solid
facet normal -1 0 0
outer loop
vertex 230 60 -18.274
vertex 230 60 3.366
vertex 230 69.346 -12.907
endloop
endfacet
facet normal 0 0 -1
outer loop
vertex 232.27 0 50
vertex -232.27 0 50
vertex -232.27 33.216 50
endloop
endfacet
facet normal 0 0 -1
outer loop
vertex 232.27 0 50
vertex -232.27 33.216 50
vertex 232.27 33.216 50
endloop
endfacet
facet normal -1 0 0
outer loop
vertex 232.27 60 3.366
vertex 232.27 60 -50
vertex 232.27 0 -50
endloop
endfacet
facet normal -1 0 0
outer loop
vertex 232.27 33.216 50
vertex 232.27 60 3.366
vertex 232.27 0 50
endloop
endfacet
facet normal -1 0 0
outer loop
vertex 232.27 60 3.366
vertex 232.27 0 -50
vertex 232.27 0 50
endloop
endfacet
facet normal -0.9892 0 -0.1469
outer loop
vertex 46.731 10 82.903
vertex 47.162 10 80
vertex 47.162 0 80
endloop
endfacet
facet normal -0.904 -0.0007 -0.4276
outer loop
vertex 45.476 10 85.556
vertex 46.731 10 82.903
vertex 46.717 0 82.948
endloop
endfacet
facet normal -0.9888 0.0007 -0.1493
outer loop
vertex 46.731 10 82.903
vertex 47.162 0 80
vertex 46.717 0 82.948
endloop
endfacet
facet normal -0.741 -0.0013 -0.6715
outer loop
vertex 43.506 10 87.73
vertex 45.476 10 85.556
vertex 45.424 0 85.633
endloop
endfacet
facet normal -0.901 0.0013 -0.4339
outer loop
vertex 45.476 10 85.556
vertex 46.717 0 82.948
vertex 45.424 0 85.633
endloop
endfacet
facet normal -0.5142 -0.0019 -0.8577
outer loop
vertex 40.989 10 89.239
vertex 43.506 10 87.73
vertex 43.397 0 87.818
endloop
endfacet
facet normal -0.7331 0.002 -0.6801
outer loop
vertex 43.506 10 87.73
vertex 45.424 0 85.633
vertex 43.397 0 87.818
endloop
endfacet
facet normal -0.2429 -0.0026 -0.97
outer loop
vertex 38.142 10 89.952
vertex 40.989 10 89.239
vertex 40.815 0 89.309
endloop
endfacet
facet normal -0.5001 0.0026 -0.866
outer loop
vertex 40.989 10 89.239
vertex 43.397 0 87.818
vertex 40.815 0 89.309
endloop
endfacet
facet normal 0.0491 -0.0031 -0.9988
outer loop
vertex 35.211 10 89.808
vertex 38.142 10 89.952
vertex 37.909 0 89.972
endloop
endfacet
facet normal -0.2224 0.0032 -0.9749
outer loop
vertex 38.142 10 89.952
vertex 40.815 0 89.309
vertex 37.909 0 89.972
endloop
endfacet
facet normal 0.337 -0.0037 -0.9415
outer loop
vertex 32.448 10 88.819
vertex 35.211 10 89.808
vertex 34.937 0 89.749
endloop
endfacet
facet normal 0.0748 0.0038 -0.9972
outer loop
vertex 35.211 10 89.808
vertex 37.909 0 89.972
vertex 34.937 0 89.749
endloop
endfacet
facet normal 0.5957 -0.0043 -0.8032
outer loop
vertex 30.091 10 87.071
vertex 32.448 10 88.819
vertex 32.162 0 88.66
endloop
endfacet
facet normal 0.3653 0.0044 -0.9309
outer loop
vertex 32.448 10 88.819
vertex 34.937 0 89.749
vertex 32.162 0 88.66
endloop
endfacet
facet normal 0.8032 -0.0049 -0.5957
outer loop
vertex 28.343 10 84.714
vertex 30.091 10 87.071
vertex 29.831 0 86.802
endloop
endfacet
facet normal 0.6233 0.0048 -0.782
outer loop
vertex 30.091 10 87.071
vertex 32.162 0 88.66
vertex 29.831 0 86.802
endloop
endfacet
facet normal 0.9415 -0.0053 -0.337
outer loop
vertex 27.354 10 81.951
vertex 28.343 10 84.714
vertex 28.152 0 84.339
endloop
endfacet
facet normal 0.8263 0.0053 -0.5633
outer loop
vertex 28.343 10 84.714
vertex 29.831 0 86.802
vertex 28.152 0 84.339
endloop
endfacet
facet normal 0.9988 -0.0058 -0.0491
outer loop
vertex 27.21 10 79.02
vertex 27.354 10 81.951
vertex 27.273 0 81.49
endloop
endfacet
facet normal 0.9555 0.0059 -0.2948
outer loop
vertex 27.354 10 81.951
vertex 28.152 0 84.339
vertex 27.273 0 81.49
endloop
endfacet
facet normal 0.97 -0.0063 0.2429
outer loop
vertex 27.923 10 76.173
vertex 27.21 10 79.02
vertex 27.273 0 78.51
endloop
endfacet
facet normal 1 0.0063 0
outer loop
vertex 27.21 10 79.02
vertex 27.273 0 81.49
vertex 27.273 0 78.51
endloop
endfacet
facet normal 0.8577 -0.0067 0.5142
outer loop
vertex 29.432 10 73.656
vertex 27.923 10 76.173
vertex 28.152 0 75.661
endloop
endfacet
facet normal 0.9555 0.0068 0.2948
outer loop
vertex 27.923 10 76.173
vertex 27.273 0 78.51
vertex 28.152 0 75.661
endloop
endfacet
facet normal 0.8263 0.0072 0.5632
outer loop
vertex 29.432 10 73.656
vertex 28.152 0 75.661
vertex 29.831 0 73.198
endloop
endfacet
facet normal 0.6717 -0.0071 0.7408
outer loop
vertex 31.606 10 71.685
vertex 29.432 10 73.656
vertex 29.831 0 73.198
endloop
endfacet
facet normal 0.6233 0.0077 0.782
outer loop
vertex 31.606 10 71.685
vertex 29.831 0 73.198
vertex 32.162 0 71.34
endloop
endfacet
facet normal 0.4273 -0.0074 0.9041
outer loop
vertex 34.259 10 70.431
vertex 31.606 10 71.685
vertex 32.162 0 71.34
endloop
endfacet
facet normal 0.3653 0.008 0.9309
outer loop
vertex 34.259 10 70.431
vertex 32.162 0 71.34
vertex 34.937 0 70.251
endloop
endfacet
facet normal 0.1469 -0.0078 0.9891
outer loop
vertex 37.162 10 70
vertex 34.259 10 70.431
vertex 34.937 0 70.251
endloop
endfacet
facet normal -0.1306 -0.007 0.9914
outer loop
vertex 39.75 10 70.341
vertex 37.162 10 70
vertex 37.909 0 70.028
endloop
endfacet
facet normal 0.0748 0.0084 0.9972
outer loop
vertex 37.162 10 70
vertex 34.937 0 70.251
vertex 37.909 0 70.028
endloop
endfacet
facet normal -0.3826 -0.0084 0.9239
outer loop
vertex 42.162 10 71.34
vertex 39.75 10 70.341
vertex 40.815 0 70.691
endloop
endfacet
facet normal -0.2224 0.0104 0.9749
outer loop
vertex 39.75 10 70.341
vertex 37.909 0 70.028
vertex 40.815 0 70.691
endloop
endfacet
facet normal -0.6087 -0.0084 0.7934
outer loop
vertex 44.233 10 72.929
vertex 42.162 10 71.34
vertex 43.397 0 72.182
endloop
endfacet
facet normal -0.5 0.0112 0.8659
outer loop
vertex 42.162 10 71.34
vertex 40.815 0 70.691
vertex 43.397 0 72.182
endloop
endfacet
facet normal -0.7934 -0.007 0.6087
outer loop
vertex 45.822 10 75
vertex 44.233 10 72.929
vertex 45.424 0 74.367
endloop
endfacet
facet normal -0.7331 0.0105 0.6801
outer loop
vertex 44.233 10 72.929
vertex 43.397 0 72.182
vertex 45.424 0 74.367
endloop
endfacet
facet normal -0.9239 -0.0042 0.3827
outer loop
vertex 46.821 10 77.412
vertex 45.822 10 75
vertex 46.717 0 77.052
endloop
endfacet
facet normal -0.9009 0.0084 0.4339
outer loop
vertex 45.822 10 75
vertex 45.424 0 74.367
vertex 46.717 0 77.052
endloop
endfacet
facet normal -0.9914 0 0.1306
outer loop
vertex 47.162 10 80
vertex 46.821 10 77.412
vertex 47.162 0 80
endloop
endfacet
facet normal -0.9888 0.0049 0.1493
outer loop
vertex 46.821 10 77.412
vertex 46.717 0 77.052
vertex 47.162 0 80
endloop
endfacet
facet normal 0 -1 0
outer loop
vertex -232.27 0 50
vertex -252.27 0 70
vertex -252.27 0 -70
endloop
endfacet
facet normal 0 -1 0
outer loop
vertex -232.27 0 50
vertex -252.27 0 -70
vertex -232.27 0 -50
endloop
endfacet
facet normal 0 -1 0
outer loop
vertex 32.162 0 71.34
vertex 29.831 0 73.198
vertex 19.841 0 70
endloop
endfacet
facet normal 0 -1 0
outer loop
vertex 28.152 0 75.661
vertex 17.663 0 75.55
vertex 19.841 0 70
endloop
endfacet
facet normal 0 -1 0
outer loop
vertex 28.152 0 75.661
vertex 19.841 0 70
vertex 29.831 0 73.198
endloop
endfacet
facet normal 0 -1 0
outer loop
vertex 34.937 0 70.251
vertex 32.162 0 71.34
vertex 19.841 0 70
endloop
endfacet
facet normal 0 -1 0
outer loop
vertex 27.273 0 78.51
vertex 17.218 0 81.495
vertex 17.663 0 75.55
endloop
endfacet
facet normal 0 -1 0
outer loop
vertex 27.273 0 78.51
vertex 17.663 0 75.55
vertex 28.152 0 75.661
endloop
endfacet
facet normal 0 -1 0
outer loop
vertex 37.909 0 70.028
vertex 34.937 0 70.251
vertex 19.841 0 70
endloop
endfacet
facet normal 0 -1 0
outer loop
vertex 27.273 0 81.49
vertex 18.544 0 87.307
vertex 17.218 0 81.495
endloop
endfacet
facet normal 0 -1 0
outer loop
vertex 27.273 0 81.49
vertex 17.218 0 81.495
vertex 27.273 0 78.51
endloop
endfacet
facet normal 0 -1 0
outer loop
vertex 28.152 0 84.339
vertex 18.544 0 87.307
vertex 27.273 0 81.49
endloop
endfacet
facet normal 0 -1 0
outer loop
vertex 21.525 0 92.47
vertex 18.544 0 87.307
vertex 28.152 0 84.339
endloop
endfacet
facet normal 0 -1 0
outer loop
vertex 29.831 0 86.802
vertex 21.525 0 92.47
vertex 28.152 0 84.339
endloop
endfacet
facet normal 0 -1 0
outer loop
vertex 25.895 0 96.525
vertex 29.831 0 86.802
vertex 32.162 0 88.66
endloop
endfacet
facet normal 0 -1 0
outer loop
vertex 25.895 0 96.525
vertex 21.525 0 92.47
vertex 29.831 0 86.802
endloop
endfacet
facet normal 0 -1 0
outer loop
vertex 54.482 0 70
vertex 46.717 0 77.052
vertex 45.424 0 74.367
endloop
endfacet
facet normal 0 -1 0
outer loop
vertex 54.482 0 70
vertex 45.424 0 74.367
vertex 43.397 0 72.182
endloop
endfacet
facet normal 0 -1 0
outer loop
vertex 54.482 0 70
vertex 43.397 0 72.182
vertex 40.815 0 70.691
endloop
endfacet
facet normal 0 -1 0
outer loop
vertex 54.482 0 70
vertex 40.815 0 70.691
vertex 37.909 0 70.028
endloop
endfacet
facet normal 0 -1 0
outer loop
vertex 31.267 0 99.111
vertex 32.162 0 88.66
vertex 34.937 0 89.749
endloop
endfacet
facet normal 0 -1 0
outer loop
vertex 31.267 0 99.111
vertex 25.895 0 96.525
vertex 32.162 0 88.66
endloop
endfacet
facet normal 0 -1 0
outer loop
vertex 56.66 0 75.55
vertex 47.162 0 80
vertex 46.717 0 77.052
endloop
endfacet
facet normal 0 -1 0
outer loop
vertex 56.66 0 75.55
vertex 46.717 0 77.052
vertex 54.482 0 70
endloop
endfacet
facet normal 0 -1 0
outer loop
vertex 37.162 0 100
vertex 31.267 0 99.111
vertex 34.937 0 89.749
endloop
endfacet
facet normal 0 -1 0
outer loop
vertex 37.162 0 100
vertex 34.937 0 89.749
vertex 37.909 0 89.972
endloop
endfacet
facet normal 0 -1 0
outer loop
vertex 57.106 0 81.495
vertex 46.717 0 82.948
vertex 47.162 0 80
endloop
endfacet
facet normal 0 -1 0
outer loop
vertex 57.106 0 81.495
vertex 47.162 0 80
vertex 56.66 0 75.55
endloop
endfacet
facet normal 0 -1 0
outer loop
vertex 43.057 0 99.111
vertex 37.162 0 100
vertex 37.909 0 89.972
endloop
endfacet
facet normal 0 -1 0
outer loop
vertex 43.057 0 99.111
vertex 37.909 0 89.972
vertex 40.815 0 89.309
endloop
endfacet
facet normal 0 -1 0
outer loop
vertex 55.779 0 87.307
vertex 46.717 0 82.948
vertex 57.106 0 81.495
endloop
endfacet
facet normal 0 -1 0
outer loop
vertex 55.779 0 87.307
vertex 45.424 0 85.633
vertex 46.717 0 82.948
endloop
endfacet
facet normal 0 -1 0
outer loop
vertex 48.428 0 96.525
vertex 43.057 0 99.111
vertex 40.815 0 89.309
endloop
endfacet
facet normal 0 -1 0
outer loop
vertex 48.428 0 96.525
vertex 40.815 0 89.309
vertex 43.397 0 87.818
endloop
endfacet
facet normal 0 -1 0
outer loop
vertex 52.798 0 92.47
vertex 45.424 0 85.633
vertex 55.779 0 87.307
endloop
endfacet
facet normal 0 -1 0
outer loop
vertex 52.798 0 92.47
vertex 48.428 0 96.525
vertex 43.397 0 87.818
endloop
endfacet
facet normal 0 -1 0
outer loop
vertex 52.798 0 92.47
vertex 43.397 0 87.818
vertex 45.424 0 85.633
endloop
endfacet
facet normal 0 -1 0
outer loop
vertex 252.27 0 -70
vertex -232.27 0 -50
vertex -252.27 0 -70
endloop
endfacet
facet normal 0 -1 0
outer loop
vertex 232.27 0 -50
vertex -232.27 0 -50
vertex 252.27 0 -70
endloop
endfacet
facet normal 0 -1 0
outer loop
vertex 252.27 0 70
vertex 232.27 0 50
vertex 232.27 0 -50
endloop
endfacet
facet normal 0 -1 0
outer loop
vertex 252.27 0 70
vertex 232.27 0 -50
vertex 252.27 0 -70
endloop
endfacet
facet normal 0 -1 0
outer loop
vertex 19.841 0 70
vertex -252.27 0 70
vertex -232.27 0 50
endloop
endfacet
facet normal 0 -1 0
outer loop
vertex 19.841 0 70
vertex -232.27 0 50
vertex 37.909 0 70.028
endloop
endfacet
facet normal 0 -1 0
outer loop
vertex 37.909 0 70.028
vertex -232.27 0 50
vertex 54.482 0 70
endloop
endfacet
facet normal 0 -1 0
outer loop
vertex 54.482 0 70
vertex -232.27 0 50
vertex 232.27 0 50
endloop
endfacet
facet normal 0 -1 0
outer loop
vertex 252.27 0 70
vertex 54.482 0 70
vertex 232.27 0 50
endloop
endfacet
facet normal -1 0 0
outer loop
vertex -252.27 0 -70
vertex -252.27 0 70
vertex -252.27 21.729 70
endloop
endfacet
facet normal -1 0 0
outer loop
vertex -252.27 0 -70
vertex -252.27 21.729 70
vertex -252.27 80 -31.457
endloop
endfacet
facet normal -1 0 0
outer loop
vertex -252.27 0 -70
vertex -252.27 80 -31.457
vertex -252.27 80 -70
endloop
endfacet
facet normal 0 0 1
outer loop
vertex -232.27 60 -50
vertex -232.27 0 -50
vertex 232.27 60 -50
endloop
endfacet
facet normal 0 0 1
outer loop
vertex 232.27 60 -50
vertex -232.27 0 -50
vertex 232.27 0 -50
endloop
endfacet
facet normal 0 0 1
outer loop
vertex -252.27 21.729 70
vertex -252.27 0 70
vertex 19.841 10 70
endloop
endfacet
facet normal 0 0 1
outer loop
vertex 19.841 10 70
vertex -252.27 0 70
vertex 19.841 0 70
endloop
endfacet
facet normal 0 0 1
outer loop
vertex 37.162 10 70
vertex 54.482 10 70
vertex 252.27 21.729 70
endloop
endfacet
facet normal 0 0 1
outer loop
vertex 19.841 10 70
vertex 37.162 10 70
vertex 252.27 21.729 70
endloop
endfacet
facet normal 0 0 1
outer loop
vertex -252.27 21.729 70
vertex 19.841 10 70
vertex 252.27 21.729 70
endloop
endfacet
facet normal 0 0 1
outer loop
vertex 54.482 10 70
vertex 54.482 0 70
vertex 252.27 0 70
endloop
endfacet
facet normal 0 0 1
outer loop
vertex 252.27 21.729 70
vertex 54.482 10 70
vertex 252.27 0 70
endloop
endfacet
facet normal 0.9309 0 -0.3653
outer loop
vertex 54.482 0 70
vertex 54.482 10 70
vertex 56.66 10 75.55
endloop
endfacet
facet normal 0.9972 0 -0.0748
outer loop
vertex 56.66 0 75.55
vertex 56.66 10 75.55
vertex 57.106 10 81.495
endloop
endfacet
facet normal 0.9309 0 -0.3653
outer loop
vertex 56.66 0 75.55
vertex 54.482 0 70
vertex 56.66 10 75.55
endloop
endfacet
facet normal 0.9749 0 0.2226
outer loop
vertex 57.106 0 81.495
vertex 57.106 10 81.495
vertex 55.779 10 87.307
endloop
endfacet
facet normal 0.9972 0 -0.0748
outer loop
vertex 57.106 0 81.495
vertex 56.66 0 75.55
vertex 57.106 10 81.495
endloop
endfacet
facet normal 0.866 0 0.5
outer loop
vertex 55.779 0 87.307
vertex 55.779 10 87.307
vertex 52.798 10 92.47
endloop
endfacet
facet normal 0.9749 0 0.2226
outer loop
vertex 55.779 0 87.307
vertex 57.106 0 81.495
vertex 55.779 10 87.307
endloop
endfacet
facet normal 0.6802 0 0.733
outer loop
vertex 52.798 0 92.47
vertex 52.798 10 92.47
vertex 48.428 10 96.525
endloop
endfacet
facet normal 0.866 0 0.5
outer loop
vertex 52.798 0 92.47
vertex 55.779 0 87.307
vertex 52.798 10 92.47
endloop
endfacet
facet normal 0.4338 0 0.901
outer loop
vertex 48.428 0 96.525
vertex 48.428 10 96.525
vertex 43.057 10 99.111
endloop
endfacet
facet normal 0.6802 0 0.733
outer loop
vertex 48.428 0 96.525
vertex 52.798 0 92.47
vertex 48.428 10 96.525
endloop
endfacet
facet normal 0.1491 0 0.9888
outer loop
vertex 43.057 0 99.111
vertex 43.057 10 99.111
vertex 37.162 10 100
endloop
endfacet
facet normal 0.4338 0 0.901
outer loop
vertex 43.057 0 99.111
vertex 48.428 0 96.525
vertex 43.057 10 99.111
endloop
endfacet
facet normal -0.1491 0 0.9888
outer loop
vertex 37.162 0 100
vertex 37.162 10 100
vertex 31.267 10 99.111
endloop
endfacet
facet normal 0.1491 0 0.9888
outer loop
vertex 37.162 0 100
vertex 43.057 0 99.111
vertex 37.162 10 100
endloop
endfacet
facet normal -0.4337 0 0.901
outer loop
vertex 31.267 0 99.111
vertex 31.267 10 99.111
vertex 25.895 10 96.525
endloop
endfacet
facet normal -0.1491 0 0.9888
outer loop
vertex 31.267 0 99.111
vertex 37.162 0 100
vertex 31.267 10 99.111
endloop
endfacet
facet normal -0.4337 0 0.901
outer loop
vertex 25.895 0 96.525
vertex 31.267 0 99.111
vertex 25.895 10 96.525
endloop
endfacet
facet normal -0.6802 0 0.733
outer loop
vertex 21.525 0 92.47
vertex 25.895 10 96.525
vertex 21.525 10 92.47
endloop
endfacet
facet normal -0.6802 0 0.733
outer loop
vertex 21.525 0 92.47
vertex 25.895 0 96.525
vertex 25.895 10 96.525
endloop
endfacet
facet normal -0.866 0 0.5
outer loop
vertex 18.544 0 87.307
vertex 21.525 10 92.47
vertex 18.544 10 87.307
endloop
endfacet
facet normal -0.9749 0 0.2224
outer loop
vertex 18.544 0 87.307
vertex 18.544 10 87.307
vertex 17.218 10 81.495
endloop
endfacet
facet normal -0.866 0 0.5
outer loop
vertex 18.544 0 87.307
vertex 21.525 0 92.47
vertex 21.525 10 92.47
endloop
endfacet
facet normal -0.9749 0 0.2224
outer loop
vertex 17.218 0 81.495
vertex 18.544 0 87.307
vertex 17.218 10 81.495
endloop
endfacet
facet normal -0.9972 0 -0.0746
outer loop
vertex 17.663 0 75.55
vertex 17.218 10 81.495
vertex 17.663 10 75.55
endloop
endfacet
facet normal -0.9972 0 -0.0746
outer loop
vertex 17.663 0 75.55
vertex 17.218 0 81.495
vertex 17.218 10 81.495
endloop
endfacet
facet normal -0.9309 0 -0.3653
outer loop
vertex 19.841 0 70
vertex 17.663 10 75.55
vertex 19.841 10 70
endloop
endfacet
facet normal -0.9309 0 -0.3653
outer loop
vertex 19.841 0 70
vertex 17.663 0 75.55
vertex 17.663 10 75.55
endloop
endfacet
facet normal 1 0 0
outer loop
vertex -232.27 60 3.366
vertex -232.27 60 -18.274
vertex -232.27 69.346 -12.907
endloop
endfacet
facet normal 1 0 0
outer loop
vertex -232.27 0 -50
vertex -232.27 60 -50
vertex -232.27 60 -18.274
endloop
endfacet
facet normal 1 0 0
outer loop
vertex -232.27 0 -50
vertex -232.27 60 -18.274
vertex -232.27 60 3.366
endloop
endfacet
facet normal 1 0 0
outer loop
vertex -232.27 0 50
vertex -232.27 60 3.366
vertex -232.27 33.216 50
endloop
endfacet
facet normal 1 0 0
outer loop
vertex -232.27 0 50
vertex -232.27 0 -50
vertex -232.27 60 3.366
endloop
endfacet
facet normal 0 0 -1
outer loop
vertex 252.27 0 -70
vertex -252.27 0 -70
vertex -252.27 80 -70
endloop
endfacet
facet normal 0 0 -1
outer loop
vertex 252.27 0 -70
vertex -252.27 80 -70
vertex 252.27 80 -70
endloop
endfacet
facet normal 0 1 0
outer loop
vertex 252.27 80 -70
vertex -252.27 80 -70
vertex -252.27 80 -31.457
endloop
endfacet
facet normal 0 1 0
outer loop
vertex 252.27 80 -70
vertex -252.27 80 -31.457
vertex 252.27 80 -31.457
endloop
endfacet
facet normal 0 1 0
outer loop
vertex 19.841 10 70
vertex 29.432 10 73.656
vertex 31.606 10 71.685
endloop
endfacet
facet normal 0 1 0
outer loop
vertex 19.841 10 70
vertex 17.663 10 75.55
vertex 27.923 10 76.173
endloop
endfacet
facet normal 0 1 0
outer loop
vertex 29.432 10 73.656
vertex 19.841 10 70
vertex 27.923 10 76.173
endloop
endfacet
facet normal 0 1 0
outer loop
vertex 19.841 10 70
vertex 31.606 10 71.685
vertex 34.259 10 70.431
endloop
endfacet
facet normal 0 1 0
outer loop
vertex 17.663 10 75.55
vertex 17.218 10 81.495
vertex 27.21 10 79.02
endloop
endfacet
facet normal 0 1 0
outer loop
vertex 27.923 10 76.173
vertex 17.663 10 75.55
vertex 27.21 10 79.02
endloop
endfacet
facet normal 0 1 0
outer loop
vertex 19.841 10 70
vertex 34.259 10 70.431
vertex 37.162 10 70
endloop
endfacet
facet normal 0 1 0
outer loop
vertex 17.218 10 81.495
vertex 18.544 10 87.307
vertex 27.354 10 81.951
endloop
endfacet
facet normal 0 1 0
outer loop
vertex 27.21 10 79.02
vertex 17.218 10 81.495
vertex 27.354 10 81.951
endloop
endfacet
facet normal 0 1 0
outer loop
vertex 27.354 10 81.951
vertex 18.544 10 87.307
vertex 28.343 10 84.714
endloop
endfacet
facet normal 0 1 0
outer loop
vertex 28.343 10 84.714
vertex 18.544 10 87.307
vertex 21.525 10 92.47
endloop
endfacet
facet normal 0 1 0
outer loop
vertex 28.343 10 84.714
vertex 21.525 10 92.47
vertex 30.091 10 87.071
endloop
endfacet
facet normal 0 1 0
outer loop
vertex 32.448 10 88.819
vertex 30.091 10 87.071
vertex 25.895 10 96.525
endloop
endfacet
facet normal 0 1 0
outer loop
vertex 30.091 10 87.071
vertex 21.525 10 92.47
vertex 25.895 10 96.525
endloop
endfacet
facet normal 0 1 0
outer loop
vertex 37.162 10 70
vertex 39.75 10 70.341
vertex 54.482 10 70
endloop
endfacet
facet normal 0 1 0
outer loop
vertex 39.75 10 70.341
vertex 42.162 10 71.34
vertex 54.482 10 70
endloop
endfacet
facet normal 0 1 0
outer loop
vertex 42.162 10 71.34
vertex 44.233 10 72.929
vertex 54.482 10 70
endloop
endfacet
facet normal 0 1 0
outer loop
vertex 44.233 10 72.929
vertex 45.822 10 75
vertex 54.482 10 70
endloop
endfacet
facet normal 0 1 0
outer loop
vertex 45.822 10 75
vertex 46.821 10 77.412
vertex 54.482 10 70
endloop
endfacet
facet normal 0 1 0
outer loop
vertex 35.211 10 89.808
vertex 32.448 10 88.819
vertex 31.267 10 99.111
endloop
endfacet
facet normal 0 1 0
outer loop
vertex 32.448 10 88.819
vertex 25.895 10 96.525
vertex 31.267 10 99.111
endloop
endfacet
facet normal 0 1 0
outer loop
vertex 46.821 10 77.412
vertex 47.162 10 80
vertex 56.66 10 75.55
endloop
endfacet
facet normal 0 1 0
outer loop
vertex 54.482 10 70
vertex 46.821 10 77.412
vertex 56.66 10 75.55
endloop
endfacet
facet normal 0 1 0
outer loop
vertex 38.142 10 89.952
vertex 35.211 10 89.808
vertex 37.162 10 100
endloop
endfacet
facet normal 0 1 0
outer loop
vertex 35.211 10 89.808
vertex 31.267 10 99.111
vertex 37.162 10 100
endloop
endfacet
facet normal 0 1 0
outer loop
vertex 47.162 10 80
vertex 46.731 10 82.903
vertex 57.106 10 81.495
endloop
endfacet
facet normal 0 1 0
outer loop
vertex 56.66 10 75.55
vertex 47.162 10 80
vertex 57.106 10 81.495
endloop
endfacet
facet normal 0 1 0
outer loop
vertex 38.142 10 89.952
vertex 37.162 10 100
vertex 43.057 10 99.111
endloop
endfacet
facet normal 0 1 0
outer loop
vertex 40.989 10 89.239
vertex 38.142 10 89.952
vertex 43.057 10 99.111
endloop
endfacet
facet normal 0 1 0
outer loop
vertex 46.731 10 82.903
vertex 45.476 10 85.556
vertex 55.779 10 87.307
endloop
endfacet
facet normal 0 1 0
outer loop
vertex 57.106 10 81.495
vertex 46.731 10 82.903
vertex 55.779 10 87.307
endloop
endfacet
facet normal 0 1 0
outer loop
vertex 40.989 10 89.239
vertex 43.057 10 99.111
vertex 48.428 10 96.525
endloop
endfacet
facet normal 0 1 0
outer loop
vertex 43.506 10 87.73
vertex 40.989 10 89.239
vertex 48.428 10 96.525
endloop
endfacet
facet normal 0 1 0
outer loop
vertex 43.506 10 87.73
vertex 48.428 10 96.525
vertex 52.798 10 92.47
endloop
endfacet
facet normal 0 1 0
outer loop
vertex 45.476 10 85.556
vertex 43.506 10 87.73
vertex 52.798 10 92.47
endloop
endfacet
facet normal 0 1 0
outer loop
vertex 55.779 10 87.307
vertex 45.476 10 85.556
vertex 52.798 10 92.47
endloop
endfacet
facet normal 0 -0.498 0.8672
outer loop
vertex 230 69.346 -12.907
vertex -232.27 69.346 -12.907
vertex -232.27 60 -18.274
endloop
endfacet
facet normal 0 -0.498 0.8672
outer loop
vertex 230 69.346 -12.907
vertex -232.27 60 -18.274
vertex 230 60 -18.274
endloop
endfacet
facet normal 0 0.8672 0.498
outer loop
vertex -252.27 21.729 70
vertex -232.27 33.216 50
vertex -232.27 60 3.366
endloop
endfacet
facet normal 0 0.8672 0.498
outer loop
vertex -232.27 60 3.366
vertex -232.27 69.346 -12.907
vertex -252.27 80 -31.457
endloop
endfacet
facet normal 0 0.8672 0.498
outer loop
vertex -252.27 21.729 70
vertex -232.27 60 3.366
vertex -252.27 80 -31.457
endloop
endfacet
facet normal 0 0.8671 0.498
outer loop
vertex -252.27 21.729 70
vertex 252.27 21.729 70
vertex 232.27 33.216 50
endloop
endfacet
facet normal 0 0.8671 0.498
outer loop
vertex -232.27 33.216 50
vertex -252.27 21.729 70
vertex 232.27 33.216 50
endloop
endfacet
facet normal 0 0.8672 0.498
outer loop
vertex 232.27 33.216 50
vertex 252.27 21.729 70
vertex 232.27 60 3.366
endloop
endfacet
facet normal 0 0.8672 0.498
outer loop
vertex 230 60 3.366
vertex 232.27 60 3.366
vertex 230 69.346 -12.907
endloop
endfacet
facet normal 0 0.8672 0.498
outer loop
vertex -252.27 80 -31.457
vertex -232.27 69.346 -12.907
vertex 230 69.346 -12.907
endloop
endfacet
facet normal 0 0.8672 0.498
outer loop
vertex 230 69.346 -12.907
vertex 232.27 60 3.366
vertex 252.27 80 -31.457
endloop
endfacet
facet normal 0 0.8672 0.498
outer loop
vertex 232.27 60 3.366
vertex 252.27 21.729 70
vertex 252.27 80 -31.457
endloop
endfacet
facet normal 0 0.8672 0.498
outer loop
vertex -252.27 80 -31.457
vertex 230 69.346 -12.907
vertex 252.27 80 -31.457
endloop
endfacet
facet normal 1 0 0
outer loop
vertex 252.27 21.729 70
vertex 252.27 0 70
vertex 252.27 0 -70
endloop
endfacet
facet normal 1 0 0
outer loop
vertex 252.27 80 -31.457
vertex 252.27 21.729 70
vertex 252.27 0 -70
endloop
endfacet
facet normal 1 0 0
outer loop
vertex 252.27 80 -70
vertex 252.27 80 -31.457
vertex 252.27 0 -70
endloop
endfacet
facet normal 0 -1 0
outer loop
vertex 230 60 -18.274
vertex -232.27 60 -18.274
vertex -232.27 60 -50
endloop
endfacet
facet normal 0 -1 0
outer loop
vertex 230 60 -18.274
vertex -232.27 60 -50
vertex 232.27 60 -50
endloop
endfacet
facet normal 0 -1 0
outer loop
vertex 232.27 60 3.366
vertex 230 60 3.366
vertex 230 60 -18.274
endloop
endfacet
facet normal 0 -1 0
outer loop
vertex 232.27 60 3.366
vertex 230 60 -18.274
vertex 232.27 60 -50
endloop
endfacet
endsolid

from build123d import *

# Parameters (mm, degrees)
SKETCH_1_W          = 504.54
SKETCH_1_H          = 140
EXTRUDE_1_DEPTH     = 80
SKETCH_2_W          = 464.54
SKETCH_2_H          = 100
CUT_EXTRUDE_1_DEPTH = 60
CUT_EXTRUDE_2_DEPTH = 516.616729364
SKETCH_8_W          = 462.27
SKETCH_8_H          = 18.765324385
CUT_EXTRUDE_3_DEPTH = 15
SKETCH_12_R         = 20
SKETCH_12_R_2       = 10
EXTRUDE_2_DEPTH     = 10


with BuildPart() as part:
    # 草圖1 → 填料-伸長1 (new body)
    with BuildSketch(Plane(origin=(0, 0, 0), x_dir=(1, 0, 0), z_dir=(0, 1, 0))):
        Rectangle(SKETCH_1_W, SKETCH_1_H)
    extrude(amount=EXTRUDE_1_DEPTH)

    # 草圖2 → 除料-伸長1 (cut)
    with BuildSketch(Plane.XZ):
        Rectangle(SKETCH_2_W, SKETCH_2_H)
    extrude(amount=-CUT_EXTRUDE_1_DEPTH, mode=Mode.SUBTRACT)

    # 草圖7 → 除料-伸長2 (cut, through all)
    with BuildSketch(Plane(origin=(252.27, 0, 0), x_dir=(0, 0, -1), z_dir=(1, 0, 0))):
        Polygon((-70, 21.729405289), (31.457073642, 80), (-70, 80), align=None)
    extrude(amount=-CUT_EXTRUDE_2_DEPTH, mode=Mode.SUBTRACT)

    # 草圖8 → 除料-伸長3 (cut)
    with BuildSketch(Plane(origin=(0, 46.570964705, 26.747448081), x_dir=(1, 0, 0), z_dir=(0, 0.8671544755717103, 0.4980392710378893))):
        with Locations((-1.135, 36.346470221)):
            Rectangle(SKETCH_8_W, SKETCH_8_H)
    extrude(amount=-CUT_EXTRUDE_3_DEPTH, mode=Mode.SUBTRACT)

    # 草圖12 → 伸長-薄件2 (add)
    with BuildSketch(Plane.XZ):
        with Locations((37.16174113, 80)):
            Circle(SKETCH_12_R)
        with Locations((37.16174113, 80)):
            Circle(SKETCH_12_R_2, mode=Mode.SUBTRACT)
    extrude(amount=-EXTRUDE_2_DEPTH)


solid = part.part
